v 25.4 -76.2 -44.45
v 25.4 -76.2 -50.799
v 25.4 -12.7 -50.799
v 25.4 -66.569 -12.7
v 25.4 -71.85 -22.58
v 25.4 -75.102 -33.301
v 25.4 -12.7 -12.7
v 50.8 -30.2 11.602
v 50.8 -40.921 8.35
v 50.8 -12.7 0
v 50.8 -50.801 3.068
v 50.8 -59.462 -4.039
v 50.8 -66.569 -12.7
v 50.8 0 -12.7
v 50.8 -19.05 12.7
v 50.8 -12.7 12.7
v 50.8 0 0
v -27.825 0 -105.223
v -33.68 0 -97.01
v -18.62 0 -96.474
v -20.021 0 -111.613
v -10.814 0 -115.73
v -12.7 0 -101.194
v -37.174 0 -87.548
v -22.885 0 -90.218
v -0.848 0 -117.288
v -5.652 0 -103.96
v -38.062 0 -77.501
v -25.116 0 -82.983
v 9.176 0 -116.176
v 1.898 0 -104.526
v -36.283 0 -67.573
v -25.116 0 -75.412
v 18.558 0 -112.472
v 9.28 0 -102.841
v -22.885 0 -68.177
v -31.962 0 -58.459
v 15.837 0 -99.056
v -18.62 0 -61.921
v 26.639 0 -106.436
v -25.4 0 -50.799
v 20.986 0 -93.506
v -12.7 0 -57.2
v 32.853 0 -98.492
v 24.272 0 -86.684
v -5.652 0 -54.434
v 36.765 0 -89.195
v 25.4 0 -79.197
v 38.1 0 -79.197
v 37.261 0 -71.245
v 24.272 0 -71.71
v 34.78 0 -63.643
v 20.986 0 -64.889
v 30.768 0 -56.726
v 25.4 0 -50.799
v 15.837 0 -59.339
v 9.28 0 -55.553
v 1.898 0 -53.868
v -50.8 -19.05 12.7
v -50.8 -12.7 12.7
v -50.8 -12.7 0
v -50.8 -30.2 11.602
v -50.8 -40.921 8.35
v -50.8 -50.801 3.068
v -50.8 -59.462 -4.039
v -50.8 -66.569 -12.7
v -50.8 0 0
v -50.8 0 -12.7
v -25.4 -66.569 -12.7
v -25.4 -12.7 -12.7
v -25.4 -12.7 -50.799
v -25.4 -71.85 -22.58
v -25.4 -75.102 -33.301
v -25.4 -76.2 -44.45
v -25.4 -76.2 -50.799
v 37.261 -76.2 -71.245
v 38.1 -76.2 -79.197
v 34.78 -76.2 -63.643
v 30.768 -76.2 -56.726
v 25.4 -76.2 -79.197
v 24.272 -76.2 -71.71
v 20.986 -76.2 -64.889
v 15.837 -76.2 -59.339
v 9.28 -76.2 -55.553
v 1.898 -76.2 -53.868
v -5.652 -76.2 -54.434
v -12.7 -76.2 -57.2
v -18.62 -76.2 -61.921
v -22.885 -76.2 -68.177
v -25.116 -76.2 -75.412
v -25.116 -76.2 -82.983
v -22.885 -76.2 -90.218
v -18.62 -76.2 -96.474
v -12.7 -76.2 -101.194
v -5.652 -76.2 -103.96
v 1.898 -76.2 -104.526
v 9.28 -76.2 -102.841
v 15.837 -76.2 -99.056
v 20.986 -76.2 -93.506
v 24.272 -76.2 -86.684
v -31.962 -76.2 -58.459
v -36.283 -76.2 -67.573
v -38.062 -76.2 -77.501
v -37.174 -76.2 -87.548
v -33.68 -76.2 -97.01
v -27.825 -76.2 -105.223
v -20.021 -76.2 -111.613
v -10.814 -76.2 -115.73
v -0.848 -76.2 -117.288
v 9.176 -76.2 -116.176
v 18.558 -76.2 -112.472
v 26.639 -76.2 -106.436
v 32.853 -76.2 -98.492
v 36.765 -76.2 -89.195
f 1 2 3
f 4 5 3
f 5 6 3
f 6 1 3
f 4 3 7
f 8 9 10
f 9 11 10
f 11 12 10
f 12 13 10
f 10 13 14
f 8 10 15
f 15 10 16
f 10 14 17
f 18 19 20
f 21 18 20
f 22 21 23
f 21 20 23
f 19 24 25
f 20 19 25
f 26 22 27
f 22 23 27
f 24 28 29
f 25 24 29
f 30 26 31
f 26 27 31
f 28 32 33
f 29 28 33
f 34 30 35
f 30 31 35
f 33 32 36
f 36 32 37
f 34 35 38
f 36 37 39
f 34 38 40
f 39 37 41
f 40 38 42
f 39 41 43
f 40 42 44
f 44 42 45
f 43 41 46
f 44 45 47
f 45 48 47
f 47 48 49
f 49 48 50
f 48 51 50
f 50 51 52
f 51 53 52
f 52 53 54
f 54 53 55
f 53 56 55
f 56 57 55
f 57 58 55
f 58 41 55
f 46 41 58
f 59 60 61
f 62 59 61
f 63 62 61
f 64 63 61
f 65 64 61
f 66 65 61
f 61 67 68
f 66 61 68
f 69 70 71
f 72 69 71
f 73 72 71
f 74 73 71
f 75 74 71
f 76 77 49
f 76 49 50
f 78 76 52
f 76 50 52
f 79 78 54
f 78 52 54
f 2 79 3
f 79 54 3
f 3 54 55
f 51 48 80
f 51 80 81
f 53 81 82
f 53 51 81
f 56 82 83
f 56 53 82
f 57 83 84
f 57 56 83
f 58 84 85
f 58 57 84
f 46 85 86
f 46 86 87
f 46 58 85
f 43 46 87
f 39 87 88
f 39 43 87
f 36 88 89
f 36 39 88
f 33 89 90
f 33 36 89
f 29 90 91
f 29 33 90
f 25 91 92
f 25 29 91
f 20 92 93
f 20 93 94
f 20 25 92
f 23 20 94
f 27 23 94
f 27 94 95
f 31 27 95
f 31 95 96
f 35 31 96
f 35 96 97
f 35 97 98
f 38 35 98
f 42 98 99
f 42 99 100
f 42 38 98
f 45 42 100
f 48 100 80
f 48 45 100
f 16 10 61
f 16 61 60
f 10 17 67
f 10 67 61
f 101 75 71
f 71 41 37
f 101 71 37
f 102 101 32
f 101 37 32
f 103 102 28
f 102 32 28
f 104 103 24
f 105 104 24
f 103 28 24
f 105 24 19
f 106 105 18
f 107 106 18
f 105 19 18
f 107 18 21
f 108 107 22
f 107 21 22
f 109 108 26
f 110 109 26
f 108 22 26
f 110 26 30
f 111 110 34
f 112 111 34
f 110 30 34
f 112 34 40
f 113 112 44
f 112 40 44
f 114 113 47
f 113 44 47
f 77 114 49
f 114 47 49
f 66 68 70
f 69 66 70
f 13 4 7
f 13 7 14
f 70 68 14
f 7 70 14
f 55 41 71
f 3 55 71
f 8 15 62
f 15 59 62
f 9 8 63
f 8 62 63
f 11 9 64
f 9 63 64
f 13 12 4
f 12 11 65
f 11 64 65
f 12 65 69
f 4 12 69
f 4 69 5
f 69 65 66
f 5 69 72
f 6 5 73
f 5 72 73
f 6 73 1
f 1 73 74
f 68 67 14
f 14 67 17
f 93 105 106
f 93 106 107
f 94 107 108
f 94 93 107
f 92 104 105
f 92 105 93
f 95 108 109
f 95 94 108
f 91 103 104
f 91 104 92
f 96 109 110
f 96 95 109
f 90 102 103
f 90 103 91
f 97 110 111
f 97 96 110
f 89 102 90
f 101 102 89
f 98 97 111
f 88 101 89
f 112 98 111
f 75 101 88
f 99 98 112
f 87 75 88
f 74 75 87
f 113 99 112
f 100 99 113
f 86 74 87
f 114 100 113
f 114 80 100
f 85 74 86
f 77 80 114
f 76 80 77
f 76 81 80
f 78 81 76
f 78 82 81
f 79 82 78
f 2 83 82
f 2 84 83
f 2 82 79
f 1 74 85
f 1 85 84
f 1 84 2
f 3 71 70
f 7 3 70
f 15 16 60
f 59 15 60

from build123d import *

# Parameters (mm, degrees)
F0_R     = 25.4
F1_DEPTH = 76.2
F2_W     = 12.7
F2_H     = 12.7
F3_DEPTH = 101.601
F4_R     = 57.15
F5_W     = 12.7
F5_H     = 38.0991366858
F6_DEPTH = 76.201


with BuildPart() as f1:
    # F0 (on Front) → F1 (new body)
    with BuildSketch(Plane.XZ):
        with BuildLine():
            Line((50.8, -12.7), (50.8, 12.7))
            Line((50.8, 12.7), (-50.8, 12.7))
            Line((-50.8, 12.7), (-50.8, -12.7))
            Line((-50.8, -12.7), (-25.4, -12.7))
            Line((-25.4, -12.7), (-25.4, -50.7991366858))
            ThreePointArc((-25.4, -50.7991366858), (0, -41.0972), (25.4, -50.7991366858))
            Line((25.4, -50.7991366858), (25.4, -12.7))
            Line((25.4, -12.7), (50.8, -12.7))
        make_face()
        with BuildLine():
            ThreePointArc((38.1, -79.1972), (34.7803824016, -63.6429401333), (25.4, -50.7991366858))
            ThreePointArc((25.4, -50.7991366858), (0, -41.0972), (-25.4, -50.7991366858))
            ThreePointArc((-25.4, -50.7991366858), (-15.5542598667, -113.9775824016), (38.1, -79.1972))
        make_face()
        with Locations((0, -79.1972)):
            Circle(F0_R, mode=Mode.SUBTRACT)
    extrude(amount=F1_DEPTH)

    # F2 (on face) → F3 (cut, through all)
    with BuildSketch(Plane(origin=(-50.8, 0, 0), x_dir=(0, -1, 0), z_dir=(-1, 0, 0))):
        with Locations((6.35, 6.35)):
            Rectangle(F2_W, F2_H)
    extrude(amount=-F3_DEPTH, mode=Mode.SUBTRACT)

    # F4
    f4_edges = [f1.edges().sort_by_distance(p)[0] for p in [
        (0, -76.2, 12.7),
    ]]
    fillet(f4_edges, radius=F4_R)

    # F5 (on face) → F6 (cut, through all)
    with BuildSketch(Plane(origin=(-25.4, 0, 0), x_dir=(0, -1, 0), z_dir=(-1, 0, 0))):
        with Locations((6.35, -31.7495683429)):
            Rectangle(F5_W, F5_H)
    extrude(amount=-F6_DEPTH, mode=Mode.SUBTRACT)


solid = f1.part
